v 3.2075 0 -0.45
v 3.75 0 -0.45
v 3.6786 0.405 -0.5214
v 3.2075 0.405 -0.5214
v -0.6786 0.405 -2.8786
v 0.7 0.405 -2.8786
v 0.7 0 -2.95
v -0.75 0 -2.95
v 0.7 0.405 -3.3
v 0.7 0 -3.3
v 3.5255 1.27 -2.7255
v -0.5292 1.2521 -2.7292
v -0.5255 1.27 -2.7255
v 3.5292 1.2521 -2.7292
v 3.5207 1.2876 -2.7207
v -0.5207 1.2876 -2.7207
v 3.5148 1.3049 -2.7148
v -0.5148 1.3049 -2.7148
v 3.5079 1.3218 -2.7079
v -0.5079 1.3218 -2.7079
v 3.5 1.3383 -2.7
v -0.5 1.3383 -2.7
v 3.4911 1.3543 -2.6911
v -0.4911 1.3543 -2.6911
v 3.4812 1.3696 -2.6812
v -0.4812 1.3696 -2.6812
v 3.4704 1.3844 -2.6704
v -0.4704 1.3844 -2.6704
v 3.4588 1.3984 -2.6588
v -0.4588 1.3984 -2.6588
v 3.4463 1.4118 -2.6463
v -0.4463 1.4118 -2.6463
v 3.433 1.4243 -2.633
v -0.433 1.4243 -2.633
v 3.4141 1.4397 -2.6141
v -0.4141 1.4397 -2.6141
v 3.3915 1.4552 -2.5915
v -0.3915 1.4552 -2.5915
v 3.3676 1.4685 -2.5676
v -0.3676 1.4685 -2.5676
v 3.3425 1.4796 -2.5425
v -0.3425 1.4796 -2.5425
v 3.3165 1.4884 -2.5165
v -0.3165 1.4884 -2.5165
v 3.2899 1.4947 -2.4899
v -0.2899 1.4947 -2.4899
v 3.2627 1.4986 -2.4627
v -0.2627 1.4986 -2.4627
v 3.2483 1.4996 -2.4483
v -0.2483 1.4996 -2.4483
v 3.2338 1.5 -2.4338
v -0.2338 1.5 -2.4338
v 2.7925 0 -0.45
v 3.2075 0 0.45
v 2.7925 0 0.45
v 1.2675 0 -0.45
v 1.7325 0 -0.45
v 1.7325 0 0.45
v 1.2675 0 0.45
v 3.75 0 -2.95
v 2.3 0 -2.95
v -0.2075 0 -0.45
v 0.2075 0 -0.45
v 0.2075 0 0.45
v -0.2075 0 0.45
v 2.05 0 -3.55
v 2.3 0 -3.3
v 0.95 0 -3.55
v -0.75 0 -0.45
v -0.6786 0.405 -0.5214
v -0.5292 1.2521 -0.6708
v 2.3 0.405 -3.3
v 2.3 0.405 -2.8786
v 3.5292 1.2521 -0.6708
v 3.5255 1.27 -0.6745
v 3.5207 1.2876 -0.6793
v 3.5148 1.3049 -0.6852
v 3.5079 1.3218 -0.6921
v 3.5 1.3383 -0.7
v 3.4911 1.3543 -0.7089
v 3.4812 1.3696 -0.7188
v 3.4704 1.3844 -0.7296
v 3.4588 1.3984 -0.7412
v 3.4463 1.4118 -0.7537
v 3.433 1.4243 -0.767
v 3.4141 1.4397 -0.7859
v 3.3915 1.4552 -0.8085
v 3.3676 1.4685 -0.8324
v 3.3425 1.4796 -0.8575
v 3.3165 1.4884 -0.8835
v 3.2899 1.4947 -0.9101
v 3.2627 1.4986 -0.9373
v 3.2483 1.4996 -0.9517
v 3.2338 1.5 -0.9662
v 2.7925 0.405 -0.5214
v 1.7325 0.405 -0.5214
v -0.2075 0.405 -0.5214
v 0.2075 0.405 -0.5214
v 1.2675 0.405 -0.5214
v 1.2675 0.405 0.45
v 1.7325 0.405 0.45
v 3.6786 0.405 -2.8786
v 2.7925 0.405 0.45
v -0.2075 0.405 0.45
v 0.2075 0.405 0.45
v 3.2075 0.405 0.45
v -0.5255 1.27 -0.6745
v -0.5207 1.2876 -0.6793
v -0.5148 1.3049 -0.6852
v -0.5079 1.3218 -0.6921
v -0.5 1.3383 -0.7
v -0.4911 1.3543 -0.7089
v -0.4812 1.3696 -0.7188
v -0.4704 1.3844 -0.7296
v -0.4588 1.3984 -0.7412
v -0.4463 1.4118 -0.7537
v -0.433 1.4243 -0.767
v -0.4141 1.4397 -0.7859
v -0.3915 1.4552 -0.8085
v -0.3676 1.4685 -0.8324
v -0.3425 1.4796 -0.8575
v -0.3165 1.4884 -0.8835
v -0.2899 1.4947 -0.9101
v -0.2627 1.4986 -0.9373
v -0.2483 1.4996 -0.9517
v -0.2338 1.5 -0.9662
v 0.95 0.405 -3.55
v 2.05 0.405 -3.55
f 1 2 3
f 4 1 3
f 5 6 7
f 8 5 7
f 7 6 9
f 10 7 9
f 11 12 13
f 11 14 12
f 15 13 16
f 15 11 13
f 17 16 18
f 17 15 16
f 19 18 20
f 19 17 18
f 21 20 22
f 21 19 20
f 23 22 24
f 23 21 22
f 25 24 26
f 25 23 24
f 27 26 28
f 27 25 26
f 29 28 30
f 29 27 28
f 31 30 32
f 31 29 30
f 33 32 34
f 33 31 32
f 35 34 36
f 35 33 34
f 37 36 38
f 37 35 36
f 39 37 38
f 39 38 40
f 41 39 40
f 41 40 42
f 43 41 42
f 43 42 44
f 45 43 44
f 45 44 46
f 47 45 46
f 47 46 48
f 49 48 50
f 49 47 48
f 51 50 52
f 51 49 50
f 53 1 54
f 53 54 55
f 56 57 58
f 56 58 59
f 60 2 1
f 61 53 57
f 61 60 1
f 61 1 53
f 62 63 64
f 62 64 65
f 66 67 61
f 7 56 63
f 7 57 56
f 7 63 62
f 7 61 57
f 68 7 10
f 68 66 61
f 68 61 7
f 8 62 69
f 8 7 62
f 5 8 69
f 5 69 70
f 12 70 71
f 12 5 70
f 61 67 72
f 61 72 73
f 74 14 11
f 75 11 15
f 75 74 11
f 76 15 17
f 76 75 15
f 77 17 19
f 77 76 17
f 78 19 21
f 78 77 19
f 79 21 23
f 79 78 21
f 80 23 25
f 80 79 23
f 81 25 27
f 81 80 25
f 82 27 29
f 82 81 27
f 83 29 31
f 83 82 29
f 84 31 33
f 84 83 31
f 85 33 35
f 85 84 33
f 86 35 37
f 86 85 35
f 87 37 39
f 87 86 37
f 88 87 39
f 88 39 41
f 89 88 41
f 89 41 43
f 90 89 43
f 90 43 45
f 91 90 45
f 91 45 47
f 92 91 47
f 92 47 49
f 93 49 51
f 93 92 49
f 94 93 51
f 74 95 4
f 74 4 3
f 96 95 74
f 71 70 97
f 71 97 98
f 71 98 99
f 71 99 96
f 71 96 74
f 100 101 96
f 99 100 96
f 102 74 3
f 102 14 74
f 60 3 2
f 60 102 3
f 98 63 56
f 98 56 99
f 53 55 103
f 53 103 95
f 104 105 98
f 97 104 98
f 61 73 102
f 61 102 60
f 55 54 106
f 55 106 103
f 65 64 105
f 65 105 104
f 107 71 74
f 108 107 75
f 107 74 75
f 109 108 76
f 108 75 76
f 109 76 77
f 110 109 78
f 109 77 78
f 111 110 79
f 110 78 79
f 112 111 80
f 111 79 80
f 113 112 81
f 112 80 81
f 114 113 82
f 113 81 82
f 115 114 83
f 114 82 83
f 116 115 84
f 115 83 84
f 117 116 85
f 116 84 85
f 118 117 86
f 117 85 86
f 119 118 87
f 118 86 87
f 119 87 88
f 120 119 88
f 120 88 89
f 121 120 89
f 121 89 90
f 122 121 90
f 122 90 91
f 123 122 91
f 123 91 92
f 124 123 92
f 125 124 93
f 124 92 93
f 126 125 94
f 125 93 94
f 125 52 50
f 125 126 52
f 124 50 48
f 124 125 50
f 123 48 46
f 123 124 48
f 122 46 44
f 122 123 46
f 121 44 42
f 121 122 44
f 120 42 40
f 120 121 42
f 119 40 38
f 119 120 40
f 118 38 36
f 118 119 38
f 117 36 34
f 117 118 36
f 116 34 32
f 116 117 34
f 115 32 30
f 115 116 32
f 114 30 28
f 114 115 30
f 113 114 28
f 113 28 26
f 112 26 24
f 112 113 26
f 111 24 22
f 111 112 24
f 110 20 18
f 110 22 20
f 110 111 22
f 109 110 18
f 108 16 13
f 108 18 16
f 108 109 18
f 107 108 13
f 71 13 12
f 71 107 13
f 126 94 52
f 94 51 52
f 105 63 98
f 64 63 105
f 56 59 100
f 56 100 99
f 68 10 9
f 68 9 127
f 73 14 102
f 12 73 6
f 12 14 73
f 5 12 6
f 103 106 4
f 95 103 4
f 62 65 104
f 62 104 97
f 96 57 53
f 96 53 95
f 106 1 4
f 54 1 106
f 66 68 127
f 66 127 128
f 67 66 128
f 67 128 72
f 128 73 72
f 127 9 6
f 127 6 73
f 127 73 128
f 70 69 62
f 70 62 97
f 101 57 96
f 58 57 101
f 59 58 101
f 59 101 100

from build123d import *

# Parameters (mm, degrees)
BASE_EXTRUDE_DEPTH = 1.5
SKETCH2_W          = 0.9
SKETCH2_H          = 1.095
SKETCH2_W_2        = 0.6
LEADS_DEPTH        = 6.924736281
DRAFT1_START       = -2.95
DRAFT1_DEPTH       = 2.5
DRAFT1_START_2     = -2
DRAFT1_2_DEPTH     = 7
DRAFT1_3_DEPTH     = 2.7
DRAFT1_START_3     = 2.3
DRAFT1_4_DEPTH     = 2.7
DRAFT1_START_4     = 0.2075
DRAFT1_5_DEPTH     = 1.06
DRAFT1_START_5     = 1.7325
DRAFT1_6_DEPTH     = 1.06
DRAFT1_7_DEPTH     = 1.7925
DRAFT1_START_6     = 3.2075
DRAFT1_8_DEPTH     = 1.7925
FILLET1_R          = 0.3


with BuildPart() as part:
    # Sketch1 → Base-Extrude (new body)
    with BuildSketch(Plane(origin=(0, 0, 0), x_dir=(1, 0, 0), z_dir=(0, 1, 0))):
        Polygon((-0.2075, -0.45), (-0.2075, 0.45), (-0.75, 0.45), (-0.75, 2.95), (0.7, 2.95), (0.7, 3.3), (0.95, 3.55), (2.05, 3.55), (2.3, 3.3), (2.3, 2.95), (3.75, 2.95), (3.75, 0.45), (3.2075, 0.45), (3.2075, -0.45), (2.7925, -0.45), (2.7925, 0.45), (1.7325, 0.45), (1.7325, -0.45), (1.2675, -0.45), (1.2675, 0.45), (0.2075, 0.45), (0.2075, -0.45), align=None)
    extrude(amount=BASE_EXTRUDE_DEPTH)

    # Sketch2 → Leads (cut, through all)
    with BuildSketch(Plane(origin=(3.75, 0, 0), x_dir=(0, 0, -1), z_dir=(1, 0, 0))):
        with Locations((0, 0.9525)):
            Rectangle(SKETCH2_W, SKETCH2_H)
        with Locations((3.25, 0.9525)):
            Rectangle(SKETCH2_W_2, SKETCH2_H)
    extrude(amount=-LEADS_DEPTH, mode=Mode.SUBTRACT)

    # Draft1: read off the stored shape, not the designer's step
    # Draft1 outline → Draft1 (cut)
    with BuildSketch(Plane.XY.offset(DRAFT1_START)):
        Polygon((-0.75, 0), (-0.485509529, 1.5), (-0.75, 1.5), align=None)
        Polygon((3.485509529, 1.5), (3.75, 0), (3.75, 1.5), align=None)
    extrude(amount=DRAFT1_DEPTH, mode=Mode.SUBTRACT)

    # Draft1 2 outline → Draft1 2 (cut)
    with BuildSketch(Plane.YZ.offset(DRAFT1_START_2)):
        Polygon((0.405, -0.521412427), (1.5, -0.714490471), (1.5, -0.45), (0.405, -0.45), align=None)
        Polygon((1.5, -2.685509529), (0.405, -2.878587573), (0.405, -2.95), (1.5, -2.95), align=None)
    extrude(amount=DRAFT1_2_DEPTH, mode=Mode.SUBTRACT)

    # Draft1 3 outline → Draft1 3 (cut)
    with BuildSketch(Plane.YZ.offset(DRAFT1_START_2)):
        Polygon((0.405, -2.878587573), (0, -2.95), (0.405, -2.95), align=None)
    extrude(amount=DRAFT1_3_DEPTH, mode=Mode.SUBTRACT)

    # Draft1 4 outline → Draft1 4 (cut)
    with BuildSketch(Plane.YZ.offset(DRAFT1_START_3)):
        Polygon((0.405, -2.878587573), (0, -2.95), (0.405, -2.95), align=None)
    extrude(amount=DRAFT1_4_DEPTH, mode=Mode.SUBTRACT)

    # Draft1 5 outline → Draft1 5 (cut)
    with BuildSketch(Plane.YZ.offset(DRAFT1_START_4)):
        Polygon((0, -0.45), (0.405, -0.521412427), (0.405, -0.45), align=None)
    extrude(amount=DRAFT1_5_DEPTH, mode=Mode.SUBTRACT)

    # Draft1 6 outline → Draft1 6 (cut)
    with BuildSketch(Plane.YZ.offset(DRAFT1_START_5)):
        Polygon((0, -0.45), (0.405, -0.521412427), (0.405, -0.45), align=None)
    extrude(amount=DRAFT1_6_DEPTH, mode=Mode.SUBTRACT)

    # Draft1 7 outline → Draft1 7 (cut)
    with BuildSketch(Plane.YZ.offset(DRAFT1_START_2)):
        Polygon((0, -0.45), (0.405, -0.521412427), (0.405, -0.45), align=None)
    extrude(amount=DRAFT1_7_DEPTH, mode=Mode.SUBTRACT)

    # Draft1 8 outline → Draft1 8 (cut)
    with BuildSketch(Plane.YZ.offset(DRAFT1_START_6)):
        Polygon((0, -0.45), (0.405, -0.521412427), (0.405, -0.45), align=None)
    extrude(amount=DRAFT1_8_DEPTH, mode=Mode.SUBTRACT)

    # Fillet1
    fillet1_edges = [part.edges().sort_by_distance(p)[0] for p in [
        (1.5, 1.5, -0.714490471),
        (3.485509529, 1.5, -1.7),
        (1.5, 1.5, -2.685509529),
        (-0.485509529, 1.5, -1.7),
    ]]
    fillet(fillet1_edges, radius=FILLET1_R)


solid = part.part
